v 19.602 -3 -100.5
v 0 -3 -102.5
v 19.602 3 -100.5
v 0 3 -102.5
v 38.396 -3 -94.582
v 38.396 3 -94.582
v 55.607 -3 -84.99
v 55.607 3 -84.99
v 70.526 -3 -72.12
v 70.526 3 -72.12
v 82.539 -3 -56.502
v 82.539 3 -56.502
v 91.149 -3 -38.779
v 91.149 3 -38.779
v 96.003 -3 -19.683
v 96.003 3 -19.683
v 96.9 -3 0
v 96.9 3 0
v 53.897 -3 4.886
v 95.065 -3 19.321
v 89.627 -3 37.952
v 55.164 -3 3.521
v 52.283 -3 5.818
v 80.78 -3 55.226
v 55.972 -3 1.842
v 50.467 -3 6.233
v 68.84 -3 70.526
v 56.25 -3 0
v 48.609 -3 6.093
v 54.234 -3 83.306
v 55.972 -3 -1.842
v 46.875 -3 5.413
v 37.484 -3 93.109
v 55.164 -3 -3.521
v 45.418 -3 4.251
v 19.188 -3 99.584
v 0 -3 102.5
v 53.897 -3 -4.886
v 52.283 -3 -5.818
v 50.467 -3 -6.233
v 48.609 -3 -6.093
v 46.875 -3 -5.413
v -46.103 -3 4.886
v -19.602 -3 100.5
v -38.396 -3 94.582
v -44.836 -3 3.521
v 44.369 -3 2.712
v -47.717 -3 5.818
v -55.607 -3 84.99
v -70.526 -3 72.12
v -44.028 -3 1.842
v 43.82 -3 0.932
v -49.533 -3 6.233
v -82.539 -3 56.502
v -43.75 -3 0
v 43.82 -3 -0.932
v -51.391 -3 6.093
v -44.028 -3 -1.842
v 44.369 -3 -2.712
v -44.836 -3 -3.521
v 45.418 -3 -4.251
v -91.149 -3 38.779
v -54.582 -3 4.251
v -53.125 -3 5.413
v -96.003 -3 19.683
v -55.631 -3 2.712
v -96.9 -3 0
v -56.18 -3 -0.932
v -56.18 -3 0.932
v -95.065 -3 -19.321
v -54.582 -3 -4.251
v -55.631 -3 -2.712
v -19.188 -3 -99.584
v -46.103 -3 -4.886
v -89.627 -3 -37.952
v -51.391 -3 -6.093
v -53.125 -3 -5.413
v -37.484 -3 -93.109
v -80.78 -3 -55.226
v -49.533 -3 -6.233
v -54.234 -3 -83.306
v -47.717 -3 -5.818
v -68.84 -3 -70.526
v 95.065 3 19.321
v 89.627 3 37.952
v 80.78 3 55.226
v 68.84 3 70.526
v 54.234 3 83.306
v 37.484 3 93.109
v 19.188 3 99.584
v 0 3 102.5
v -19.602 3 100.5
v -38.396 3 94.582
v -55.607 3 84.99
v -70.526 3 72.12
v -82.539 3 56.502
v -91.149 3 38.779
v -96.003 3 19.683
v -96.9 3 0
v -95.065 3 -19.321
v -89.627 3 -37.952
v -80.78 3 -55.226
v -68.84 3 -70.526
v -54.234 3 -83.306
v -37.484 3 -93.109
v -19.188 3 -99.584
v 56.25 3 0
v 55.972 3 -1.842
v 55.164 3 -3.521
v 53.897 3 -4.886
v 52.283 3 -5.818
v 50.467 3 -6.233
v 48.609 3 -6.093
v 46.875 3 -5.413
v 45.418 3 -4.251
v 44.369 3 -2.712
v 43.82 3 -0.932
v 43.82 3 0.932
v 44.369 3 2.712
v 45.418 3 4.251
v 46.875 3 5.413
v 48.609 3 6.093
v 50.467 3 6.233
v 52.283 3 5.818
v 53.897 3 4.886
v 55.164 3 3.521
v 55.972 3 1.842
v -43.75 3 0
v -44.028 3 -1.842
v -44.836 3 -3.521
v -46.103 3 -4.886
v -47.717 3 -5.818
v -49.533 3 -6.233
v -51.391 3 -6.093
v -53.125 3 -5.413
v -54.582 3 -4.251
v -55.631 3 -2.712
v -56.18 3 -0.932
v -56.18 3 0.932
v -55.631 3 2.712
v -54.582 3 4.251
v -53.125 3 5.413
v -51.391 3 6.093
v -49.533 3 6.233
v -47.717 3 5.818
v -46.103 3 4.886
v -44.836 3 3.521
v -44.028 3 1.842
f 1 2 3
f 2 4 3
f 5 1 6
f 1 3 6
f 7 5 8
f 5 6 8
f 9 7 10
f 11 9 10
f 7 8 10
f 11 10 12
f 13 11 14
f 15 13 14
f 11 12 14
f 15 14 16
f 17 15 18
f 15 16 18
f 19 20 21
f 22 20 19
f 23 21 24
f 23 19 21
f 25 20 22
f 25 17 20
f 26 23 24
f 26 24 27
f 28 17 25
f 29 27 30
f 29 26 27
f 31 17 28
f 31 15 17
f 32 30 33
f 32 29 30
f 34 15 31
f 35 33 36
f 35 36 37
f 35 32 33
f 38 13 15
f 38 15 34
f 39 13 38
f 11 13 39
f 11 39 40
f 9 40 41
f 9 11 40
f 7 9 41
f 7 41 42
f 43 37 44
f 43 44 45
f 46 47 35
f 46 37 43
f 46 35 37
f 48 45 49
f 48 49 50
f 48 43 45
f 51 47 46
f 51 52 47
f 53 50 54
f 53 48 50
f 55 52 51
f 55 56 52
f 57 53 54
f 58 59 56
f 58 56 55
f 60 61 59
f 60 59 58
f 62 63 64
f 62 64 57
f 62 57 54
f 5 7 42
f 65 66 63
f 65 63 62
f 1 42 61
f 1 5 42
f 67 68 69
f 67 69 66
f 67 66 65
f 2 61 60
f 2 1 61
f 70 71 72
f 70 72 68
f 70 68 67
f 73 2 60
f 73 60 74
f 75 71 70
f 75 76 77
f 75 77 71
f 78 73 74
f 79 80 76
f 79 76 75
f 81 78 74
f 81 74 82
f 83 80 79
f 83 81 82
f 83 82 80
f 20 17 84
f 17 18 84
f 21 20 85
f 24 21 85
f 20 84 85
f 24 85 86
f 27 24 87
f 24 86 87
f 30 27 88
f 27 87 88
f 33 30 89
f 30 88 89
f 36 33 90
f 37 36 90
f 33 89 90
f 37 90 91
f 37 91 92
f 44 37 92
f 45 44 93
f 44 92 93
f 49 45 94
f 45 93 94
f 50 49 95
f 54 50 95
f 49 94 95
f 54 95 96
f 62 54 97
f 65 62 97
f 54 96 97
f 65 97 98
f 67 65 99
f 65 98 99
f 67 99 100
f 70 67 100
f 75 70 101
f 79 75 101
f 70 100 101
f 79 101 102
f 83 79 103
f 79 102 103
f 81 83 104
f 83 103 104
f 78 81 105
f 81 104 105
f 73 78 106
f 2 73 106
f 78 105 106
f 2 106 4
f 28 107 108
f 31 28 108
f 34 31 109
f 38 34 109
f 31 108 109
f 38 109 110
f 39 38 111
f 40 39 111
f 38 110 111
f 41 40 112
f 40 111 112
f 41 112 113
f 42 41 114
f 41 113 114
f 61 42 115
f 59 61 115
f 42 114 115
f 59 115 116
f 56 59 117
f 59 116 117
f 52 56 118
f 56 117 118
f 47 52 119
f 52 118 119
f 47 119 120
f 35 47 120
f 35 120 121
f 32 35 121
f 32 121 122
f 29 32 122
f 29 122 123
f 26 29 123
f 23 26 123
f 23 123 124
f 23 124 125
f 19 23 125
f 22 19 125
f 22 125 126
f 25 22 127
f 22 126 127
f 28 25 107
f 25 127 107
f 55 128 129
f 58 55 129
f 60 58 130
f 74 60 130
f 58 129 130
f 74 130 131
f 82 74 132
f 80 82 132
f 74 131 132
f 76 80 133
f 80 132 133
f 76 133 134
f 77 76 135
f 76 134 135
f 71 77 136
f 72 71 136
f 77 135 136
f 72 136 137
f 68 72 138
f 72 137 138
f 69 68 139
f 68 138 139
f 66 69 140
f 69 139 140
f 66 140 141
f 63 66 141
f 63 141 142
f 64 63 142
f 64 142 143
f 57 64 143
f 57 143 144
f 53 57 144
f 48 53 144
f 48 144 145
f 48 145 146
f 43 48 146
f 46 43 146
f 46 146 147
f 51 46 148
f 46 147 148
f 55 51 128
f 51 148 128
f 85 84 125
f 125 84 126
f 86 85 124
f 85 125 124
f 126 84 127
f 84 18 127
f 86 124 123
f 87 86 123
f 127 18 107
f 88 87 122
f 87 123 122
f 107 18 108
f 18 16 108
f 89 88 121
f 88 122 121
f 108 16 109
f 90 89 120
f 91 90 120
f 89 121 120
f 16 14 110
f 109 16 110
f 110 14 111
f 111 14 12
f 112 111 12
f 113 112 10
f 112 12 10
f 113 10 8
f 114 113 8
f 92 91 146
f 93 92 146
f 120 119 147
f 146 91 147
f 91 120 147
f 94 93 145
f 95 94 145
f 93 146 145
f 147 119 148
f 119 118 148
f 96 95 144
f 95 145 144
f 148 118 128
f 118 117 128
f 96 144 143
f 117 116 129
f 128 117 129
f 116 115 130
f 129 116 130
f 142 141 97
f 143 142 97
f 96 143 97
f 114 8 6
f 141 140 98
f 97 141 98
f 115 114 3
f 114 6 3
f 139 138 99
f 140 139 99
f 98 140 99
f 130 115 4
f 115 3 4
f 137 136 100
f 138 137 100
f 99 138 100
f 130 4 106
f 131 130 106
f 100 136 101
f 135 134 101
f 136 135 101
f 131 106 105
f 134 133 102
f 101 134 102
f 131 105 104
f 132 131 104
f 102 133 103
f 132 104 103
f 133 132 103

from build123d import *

# Parameters (mm, degrees)
BOSS_EXTRUDE1_DEPTH = 3
SKETCH2_R           = 6.25
CUT_EXTRUDE1_DEPTH  = 6


with BuildPart() as part:
    # Sketch1 → Boss-Extrude1 (new body, symmetric)
    with BuildSketch(Plane(origin=(0, 0, 0), x_dir=(1, 0, 0), z_dir=(0, 1, 0))):
        with BuildLine():
            ThreePointArc((-96.9, 0), (-68.840352075, 70.526342596), (0, 102.5))
            ThreePointArc((0, 102.5), (70.526342596, 72.120220464), (96.9, 0))
            ThreePointArc((96.9, 0), (68.840352075, -70.526342596), (0, -102.5))
            ThreePointArc((0, -102.5), (-70.526342596, -72.120220464), (-96.9, 0))
        make_face()
    extrude(amount=BOSS_EXTRUDE1_DEPTH, both=True)

    # Sketch2 → Cut-Extrude1 (cut)
    with BuildSketch(Plane(origin=(0, 3, 0), x_dir=(1, 0, 0), z_dir=(0, 1, 0))):
        with Locations((-50, 0)):
            Circle(SKETCH2_R)
        with Locations((50, 0)):
            Circle(SKETCH2_R)
    extrude(amount=-CUT_EXTRUDE1_DEPTH, mode=Mode.SUBTRACT)


solid = part.part
